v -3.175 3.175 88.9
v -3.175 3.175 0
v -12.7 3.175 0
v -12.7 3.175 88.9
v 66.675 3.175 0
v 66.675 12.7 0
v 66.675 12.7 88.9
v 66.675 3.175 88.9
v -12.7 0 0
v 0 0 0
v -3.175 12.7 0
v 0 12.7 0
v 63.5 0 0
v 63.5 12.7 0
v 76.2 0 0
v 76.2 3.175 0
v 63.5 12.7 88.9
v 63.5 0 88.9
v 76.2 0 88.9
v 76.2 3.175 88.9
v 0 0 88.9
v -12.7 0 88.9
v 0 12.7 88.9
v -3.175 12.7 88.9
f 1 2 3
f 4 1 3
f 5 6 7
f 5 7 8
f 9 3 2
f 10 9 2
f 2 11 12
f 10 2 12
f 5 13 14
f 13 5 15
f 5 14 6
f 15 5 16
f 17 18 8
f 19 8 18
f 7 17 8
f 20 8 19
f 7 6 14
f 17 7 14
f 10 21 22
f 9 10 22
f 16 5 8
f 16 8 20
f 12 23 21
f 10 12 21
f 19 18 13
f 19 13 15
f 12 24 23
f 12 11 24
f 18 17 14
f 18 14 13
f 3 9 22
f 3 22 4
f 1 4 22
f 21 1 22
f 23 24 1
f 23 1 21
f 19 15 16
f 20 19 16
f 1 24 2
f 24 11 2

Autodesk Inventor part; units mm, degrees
ref_plane "YZ Plane" through (0, 0, 0) normal (1, 0, 0) x (0, 1, 0)
ref_plane "XZ Plane" through (0, 0, 0) normal (0, 1, 0) x (-1, 0, 0)
ref_plane "XY Plane" through (0, 0, 0) normal (0, 0, 1) x (1, 0, 0)
sketch "Sketch1" plane through (0, 0, 0) normal (0, 0, 1) x (1, 0, 0)
  line L0 (0, 0) -> (-12.7, 0)
  line L1 (-12.7, 0) -> (-12.7, 12.7)
  line L2 (-12.7, 12.7) -> (0, 12.7)
  line L3 (0, 12.7) -> (0, 0)
  line L4 (-12.7, 12.7) -> (-3.175, 12.7)
  line L5 (-3.175, 12.7) -> (-3.175, 3.175)
  line L6 (-3.175, 3.175) -> (-12.7, 3.175)
  line L7 (-12.7, 3.175) -> (-12.7, 12.7)
  line L8 (63.5, 0) -> (76.2, 0)
  line L9 (76.2, 0) -> (76.2, 12.7)
  line L10 (76.2, 12.7) -> (63.5, 12.7)
  line L11 (63.5, 12.7) -> (63.5, 0)
  line L12 (76.2, 12.7) -> (66.675, 12.7)
  line L13 (66.675, 12.7) -> (66.675, 3.175)
  line L14 (66.675, 3.175) -> (76.2, 3.175)
  line L15 (76.2, 3.175) -> (76.2, 12.7)
  point P0 (-3.175, 12.7)
  dimension "d0" = 12.7
  dimension "d1" = 12.7
  dimension "d2" = 3.175
  dimension "d3" = 3.175
  dimension "d4" = 12.7
  dimension "d5" = 12.7
  dimension "d6" = 3.175
  dimension "d7" = 3.175
  dimension "d8" = 63.5
extrude "Extrusion1" add sketch "Sketch1" along normal blind 88.9 contours L0 L1 L6 L5 L2 L3 | L11 L10 L13 L14 L9 L8
properties part number "Arm holder"
